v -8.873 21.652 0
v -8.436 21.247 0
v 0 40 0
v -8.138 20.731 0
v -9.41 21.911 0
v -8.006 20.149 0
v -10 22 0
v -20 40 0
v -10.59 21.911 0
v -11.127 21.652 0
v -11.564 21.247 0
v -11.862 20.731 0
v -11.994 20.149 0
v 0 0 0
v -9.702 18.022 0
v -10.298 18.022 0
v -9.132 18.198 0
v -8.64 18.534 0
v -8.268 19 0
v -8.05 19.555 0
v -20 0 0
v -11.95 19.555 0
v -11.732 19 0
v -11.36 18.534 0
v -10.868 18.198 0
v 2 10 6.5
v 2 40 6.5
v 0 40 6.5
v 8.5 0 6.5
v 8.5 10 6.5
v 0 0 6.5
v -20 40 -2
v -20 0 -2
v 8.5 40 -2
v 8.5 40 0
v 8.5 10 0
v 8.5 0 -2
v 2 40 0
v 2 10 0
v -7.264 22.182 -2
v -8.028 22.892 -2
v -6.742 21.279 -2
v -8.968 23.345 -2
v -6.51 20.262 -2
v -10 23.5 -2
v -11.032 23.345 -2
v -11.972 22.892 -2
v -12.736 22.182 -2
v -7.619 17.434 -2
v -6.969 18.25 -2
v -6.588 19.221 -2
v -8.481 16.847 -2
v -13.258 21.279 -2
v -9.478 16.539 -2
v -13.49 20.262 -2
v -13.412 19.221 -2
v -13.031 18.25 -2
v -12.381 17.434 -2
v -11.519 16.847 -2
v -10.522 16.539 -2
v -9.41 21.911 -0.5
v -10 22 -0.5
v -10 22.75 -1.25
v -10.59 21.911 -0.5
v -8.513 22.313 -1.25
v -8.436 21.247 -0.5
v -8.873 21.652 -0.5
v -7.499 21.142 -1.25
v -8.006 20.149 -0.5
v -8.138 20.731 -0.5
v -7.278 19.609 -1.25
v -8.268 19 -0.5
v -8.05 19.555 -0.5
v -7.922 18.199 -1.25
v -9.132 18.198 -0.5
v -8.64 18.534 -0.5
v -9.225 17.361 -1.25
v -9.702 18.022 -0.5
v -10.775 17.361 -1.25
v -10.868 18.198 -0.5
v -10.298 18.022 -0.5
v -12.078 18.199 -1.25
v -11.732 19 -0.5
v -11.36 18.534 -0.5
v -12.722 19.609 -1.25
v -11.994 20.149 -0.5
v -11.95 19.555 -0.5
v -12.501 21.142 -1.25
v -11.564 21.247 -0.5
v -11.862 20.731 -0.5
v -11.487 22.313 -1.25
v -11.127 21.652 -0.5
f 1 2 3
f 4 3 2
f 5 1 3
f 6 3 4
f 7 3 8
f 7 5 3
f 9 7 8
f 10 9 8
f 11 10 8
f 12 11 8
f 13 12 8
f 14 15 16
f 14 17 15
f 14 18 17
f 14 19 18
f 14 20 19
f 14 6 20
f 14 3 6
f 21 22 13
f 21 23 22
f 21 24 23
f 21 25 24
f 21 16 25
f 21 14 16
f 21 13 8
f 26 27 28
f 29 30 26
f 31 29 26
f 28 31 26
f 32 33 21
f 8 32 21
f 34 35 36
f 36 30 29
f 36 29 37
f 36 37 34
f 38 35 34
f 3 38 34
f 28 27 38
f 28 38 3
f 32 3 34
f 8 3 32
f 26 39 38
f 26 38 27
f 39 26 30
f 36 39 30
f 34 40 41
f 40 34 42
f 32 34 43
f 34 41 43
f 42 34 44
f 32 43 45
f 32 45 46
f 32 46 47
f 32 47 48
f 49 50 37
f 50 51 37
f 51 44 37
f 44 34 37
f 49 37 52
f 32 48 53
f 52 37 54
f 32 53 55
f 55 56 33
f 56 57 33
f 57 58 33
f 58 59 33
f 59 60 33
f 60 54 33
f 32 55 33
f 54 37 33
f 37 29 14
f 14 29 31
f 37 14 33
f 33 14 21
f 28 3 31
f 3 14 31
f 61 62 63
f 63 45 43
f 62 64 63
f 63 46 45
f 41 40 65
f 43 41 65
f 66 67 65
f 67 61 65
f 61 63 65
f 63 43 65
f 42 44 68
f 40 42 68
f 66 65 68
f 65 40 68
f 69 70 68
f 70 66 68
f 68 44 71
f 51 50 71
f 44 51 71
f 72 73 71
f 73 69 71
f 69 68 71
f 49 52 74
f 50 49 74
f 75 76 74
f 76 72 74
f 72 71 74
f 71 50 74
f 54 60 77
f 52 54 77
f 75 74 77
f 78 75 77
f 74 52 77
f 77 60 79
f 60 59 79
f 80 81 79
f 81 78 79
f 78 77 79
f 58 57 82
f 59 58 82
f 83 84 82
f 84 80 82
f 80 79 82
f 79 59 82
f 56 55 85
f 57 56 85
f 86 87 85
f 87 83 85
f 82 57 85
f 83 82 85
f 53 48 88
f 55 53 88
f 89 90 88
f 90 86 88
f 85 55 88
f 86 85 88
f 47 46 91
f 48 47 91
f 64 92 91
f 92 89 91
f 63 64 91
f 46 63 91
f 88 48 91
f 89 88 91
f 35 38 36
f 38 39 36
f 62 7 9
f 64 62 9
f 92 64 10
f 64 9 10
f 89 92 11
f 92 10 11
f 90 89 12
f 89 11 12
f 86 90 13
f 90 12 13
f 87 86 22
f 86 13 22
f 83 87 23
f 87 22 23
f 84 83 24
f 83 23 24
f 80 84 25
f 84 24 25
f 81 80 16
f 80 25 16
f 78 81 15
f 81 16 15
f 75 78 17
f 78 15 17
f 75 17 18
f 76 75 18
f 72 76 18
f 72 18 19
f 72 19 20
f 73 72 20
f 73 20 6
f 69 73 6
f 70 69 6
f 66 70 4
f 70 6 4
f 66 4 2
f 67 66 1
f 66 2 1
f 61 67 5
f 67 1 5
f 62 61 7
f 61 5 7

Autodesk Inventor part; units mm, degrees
ref_plane "YZ Plane" through (0, 0, 0) normal (1, 0, 0) x (0, 1, 0)
ref_plane "XZ Plane" through (0, 0, 0) normal (0, 1, 0) x (-1, 0, 0)
ref_plane "XY Plane" through (0, 0, 0) normal (0, 0, 1) x (1, 0, 0)
sketch "Sketch1" plane through (0, 0, 0) normal (0, 1, 0) x (-1, 0, 0)
  line L0 (0, 0) -> (0, 6.5)
  line L1 (0, 0) -> (20, 0)
  line L2 (-2, -2) -> (20, -2)
  line L3 (-2, 0) -> (-2, 6.5)
  line L4 (20, -2) -> (20, 0)
  line L5 (-2, 0) -> (-8.5, 0)
  line L6 (-8.5, -2) -> (-2, -2)
  line L7 (-8.5, 0) -> (-8.5, -2)
  line L8 (-2, 6.5) -> (0, 6.5)
  dimension "d2" = 20
  dimension "d3" = 2
  dimension "d5" = 2
  dimension "d30" = 6.5
  dimension "d33" = 6.5
extrude "Extrusion1" add sketch "Sketch1" along normal blind 40
sketch "Sketch2" plane through (0, 0, 0) normal (0, -1, 0) x (1, 0, 0)
  line L0 (2, 0) -> (8.5, 0)
  line L1 (8.5, 0) -> (8.5, 6.5)
  line L2 (8.5, 6.5) -> (2, 6.5)
  line L3 (2, 6.5) -> (2, 0)
  point P0 (0, 0)
  dimension "d10" = 6.5
  dimension "d11" = 6.5
extrude "Extrusion2" add sketch "Sketch2" against normal blind 10
sketch "Sketch3" plane through (22, 0, -2) normal (0, 0, -1) x (-1, 0, 0)
  line L0 (42, 0) -> (42, 40) projected
  circle A0 centre (32, 20) radius 3.5
  circle A1 centre (32, 20) radius 2
  line L1 (32, 20) -> (42, 20)
  line L2 (42, 0) -> (42, 40) projected
  point P0 (22, 0)
  dimension "d15" = 7
  dimension "d18" = 4
  dimension "d32" = 10
hole "Hole1" at (-10, 20, -2) direction (0, 0, 1) diameter 4 end through all countersink diameter 7 countersink angle 90
properties part number "3DPrintBracket" material "PC/ABS Plastic"
